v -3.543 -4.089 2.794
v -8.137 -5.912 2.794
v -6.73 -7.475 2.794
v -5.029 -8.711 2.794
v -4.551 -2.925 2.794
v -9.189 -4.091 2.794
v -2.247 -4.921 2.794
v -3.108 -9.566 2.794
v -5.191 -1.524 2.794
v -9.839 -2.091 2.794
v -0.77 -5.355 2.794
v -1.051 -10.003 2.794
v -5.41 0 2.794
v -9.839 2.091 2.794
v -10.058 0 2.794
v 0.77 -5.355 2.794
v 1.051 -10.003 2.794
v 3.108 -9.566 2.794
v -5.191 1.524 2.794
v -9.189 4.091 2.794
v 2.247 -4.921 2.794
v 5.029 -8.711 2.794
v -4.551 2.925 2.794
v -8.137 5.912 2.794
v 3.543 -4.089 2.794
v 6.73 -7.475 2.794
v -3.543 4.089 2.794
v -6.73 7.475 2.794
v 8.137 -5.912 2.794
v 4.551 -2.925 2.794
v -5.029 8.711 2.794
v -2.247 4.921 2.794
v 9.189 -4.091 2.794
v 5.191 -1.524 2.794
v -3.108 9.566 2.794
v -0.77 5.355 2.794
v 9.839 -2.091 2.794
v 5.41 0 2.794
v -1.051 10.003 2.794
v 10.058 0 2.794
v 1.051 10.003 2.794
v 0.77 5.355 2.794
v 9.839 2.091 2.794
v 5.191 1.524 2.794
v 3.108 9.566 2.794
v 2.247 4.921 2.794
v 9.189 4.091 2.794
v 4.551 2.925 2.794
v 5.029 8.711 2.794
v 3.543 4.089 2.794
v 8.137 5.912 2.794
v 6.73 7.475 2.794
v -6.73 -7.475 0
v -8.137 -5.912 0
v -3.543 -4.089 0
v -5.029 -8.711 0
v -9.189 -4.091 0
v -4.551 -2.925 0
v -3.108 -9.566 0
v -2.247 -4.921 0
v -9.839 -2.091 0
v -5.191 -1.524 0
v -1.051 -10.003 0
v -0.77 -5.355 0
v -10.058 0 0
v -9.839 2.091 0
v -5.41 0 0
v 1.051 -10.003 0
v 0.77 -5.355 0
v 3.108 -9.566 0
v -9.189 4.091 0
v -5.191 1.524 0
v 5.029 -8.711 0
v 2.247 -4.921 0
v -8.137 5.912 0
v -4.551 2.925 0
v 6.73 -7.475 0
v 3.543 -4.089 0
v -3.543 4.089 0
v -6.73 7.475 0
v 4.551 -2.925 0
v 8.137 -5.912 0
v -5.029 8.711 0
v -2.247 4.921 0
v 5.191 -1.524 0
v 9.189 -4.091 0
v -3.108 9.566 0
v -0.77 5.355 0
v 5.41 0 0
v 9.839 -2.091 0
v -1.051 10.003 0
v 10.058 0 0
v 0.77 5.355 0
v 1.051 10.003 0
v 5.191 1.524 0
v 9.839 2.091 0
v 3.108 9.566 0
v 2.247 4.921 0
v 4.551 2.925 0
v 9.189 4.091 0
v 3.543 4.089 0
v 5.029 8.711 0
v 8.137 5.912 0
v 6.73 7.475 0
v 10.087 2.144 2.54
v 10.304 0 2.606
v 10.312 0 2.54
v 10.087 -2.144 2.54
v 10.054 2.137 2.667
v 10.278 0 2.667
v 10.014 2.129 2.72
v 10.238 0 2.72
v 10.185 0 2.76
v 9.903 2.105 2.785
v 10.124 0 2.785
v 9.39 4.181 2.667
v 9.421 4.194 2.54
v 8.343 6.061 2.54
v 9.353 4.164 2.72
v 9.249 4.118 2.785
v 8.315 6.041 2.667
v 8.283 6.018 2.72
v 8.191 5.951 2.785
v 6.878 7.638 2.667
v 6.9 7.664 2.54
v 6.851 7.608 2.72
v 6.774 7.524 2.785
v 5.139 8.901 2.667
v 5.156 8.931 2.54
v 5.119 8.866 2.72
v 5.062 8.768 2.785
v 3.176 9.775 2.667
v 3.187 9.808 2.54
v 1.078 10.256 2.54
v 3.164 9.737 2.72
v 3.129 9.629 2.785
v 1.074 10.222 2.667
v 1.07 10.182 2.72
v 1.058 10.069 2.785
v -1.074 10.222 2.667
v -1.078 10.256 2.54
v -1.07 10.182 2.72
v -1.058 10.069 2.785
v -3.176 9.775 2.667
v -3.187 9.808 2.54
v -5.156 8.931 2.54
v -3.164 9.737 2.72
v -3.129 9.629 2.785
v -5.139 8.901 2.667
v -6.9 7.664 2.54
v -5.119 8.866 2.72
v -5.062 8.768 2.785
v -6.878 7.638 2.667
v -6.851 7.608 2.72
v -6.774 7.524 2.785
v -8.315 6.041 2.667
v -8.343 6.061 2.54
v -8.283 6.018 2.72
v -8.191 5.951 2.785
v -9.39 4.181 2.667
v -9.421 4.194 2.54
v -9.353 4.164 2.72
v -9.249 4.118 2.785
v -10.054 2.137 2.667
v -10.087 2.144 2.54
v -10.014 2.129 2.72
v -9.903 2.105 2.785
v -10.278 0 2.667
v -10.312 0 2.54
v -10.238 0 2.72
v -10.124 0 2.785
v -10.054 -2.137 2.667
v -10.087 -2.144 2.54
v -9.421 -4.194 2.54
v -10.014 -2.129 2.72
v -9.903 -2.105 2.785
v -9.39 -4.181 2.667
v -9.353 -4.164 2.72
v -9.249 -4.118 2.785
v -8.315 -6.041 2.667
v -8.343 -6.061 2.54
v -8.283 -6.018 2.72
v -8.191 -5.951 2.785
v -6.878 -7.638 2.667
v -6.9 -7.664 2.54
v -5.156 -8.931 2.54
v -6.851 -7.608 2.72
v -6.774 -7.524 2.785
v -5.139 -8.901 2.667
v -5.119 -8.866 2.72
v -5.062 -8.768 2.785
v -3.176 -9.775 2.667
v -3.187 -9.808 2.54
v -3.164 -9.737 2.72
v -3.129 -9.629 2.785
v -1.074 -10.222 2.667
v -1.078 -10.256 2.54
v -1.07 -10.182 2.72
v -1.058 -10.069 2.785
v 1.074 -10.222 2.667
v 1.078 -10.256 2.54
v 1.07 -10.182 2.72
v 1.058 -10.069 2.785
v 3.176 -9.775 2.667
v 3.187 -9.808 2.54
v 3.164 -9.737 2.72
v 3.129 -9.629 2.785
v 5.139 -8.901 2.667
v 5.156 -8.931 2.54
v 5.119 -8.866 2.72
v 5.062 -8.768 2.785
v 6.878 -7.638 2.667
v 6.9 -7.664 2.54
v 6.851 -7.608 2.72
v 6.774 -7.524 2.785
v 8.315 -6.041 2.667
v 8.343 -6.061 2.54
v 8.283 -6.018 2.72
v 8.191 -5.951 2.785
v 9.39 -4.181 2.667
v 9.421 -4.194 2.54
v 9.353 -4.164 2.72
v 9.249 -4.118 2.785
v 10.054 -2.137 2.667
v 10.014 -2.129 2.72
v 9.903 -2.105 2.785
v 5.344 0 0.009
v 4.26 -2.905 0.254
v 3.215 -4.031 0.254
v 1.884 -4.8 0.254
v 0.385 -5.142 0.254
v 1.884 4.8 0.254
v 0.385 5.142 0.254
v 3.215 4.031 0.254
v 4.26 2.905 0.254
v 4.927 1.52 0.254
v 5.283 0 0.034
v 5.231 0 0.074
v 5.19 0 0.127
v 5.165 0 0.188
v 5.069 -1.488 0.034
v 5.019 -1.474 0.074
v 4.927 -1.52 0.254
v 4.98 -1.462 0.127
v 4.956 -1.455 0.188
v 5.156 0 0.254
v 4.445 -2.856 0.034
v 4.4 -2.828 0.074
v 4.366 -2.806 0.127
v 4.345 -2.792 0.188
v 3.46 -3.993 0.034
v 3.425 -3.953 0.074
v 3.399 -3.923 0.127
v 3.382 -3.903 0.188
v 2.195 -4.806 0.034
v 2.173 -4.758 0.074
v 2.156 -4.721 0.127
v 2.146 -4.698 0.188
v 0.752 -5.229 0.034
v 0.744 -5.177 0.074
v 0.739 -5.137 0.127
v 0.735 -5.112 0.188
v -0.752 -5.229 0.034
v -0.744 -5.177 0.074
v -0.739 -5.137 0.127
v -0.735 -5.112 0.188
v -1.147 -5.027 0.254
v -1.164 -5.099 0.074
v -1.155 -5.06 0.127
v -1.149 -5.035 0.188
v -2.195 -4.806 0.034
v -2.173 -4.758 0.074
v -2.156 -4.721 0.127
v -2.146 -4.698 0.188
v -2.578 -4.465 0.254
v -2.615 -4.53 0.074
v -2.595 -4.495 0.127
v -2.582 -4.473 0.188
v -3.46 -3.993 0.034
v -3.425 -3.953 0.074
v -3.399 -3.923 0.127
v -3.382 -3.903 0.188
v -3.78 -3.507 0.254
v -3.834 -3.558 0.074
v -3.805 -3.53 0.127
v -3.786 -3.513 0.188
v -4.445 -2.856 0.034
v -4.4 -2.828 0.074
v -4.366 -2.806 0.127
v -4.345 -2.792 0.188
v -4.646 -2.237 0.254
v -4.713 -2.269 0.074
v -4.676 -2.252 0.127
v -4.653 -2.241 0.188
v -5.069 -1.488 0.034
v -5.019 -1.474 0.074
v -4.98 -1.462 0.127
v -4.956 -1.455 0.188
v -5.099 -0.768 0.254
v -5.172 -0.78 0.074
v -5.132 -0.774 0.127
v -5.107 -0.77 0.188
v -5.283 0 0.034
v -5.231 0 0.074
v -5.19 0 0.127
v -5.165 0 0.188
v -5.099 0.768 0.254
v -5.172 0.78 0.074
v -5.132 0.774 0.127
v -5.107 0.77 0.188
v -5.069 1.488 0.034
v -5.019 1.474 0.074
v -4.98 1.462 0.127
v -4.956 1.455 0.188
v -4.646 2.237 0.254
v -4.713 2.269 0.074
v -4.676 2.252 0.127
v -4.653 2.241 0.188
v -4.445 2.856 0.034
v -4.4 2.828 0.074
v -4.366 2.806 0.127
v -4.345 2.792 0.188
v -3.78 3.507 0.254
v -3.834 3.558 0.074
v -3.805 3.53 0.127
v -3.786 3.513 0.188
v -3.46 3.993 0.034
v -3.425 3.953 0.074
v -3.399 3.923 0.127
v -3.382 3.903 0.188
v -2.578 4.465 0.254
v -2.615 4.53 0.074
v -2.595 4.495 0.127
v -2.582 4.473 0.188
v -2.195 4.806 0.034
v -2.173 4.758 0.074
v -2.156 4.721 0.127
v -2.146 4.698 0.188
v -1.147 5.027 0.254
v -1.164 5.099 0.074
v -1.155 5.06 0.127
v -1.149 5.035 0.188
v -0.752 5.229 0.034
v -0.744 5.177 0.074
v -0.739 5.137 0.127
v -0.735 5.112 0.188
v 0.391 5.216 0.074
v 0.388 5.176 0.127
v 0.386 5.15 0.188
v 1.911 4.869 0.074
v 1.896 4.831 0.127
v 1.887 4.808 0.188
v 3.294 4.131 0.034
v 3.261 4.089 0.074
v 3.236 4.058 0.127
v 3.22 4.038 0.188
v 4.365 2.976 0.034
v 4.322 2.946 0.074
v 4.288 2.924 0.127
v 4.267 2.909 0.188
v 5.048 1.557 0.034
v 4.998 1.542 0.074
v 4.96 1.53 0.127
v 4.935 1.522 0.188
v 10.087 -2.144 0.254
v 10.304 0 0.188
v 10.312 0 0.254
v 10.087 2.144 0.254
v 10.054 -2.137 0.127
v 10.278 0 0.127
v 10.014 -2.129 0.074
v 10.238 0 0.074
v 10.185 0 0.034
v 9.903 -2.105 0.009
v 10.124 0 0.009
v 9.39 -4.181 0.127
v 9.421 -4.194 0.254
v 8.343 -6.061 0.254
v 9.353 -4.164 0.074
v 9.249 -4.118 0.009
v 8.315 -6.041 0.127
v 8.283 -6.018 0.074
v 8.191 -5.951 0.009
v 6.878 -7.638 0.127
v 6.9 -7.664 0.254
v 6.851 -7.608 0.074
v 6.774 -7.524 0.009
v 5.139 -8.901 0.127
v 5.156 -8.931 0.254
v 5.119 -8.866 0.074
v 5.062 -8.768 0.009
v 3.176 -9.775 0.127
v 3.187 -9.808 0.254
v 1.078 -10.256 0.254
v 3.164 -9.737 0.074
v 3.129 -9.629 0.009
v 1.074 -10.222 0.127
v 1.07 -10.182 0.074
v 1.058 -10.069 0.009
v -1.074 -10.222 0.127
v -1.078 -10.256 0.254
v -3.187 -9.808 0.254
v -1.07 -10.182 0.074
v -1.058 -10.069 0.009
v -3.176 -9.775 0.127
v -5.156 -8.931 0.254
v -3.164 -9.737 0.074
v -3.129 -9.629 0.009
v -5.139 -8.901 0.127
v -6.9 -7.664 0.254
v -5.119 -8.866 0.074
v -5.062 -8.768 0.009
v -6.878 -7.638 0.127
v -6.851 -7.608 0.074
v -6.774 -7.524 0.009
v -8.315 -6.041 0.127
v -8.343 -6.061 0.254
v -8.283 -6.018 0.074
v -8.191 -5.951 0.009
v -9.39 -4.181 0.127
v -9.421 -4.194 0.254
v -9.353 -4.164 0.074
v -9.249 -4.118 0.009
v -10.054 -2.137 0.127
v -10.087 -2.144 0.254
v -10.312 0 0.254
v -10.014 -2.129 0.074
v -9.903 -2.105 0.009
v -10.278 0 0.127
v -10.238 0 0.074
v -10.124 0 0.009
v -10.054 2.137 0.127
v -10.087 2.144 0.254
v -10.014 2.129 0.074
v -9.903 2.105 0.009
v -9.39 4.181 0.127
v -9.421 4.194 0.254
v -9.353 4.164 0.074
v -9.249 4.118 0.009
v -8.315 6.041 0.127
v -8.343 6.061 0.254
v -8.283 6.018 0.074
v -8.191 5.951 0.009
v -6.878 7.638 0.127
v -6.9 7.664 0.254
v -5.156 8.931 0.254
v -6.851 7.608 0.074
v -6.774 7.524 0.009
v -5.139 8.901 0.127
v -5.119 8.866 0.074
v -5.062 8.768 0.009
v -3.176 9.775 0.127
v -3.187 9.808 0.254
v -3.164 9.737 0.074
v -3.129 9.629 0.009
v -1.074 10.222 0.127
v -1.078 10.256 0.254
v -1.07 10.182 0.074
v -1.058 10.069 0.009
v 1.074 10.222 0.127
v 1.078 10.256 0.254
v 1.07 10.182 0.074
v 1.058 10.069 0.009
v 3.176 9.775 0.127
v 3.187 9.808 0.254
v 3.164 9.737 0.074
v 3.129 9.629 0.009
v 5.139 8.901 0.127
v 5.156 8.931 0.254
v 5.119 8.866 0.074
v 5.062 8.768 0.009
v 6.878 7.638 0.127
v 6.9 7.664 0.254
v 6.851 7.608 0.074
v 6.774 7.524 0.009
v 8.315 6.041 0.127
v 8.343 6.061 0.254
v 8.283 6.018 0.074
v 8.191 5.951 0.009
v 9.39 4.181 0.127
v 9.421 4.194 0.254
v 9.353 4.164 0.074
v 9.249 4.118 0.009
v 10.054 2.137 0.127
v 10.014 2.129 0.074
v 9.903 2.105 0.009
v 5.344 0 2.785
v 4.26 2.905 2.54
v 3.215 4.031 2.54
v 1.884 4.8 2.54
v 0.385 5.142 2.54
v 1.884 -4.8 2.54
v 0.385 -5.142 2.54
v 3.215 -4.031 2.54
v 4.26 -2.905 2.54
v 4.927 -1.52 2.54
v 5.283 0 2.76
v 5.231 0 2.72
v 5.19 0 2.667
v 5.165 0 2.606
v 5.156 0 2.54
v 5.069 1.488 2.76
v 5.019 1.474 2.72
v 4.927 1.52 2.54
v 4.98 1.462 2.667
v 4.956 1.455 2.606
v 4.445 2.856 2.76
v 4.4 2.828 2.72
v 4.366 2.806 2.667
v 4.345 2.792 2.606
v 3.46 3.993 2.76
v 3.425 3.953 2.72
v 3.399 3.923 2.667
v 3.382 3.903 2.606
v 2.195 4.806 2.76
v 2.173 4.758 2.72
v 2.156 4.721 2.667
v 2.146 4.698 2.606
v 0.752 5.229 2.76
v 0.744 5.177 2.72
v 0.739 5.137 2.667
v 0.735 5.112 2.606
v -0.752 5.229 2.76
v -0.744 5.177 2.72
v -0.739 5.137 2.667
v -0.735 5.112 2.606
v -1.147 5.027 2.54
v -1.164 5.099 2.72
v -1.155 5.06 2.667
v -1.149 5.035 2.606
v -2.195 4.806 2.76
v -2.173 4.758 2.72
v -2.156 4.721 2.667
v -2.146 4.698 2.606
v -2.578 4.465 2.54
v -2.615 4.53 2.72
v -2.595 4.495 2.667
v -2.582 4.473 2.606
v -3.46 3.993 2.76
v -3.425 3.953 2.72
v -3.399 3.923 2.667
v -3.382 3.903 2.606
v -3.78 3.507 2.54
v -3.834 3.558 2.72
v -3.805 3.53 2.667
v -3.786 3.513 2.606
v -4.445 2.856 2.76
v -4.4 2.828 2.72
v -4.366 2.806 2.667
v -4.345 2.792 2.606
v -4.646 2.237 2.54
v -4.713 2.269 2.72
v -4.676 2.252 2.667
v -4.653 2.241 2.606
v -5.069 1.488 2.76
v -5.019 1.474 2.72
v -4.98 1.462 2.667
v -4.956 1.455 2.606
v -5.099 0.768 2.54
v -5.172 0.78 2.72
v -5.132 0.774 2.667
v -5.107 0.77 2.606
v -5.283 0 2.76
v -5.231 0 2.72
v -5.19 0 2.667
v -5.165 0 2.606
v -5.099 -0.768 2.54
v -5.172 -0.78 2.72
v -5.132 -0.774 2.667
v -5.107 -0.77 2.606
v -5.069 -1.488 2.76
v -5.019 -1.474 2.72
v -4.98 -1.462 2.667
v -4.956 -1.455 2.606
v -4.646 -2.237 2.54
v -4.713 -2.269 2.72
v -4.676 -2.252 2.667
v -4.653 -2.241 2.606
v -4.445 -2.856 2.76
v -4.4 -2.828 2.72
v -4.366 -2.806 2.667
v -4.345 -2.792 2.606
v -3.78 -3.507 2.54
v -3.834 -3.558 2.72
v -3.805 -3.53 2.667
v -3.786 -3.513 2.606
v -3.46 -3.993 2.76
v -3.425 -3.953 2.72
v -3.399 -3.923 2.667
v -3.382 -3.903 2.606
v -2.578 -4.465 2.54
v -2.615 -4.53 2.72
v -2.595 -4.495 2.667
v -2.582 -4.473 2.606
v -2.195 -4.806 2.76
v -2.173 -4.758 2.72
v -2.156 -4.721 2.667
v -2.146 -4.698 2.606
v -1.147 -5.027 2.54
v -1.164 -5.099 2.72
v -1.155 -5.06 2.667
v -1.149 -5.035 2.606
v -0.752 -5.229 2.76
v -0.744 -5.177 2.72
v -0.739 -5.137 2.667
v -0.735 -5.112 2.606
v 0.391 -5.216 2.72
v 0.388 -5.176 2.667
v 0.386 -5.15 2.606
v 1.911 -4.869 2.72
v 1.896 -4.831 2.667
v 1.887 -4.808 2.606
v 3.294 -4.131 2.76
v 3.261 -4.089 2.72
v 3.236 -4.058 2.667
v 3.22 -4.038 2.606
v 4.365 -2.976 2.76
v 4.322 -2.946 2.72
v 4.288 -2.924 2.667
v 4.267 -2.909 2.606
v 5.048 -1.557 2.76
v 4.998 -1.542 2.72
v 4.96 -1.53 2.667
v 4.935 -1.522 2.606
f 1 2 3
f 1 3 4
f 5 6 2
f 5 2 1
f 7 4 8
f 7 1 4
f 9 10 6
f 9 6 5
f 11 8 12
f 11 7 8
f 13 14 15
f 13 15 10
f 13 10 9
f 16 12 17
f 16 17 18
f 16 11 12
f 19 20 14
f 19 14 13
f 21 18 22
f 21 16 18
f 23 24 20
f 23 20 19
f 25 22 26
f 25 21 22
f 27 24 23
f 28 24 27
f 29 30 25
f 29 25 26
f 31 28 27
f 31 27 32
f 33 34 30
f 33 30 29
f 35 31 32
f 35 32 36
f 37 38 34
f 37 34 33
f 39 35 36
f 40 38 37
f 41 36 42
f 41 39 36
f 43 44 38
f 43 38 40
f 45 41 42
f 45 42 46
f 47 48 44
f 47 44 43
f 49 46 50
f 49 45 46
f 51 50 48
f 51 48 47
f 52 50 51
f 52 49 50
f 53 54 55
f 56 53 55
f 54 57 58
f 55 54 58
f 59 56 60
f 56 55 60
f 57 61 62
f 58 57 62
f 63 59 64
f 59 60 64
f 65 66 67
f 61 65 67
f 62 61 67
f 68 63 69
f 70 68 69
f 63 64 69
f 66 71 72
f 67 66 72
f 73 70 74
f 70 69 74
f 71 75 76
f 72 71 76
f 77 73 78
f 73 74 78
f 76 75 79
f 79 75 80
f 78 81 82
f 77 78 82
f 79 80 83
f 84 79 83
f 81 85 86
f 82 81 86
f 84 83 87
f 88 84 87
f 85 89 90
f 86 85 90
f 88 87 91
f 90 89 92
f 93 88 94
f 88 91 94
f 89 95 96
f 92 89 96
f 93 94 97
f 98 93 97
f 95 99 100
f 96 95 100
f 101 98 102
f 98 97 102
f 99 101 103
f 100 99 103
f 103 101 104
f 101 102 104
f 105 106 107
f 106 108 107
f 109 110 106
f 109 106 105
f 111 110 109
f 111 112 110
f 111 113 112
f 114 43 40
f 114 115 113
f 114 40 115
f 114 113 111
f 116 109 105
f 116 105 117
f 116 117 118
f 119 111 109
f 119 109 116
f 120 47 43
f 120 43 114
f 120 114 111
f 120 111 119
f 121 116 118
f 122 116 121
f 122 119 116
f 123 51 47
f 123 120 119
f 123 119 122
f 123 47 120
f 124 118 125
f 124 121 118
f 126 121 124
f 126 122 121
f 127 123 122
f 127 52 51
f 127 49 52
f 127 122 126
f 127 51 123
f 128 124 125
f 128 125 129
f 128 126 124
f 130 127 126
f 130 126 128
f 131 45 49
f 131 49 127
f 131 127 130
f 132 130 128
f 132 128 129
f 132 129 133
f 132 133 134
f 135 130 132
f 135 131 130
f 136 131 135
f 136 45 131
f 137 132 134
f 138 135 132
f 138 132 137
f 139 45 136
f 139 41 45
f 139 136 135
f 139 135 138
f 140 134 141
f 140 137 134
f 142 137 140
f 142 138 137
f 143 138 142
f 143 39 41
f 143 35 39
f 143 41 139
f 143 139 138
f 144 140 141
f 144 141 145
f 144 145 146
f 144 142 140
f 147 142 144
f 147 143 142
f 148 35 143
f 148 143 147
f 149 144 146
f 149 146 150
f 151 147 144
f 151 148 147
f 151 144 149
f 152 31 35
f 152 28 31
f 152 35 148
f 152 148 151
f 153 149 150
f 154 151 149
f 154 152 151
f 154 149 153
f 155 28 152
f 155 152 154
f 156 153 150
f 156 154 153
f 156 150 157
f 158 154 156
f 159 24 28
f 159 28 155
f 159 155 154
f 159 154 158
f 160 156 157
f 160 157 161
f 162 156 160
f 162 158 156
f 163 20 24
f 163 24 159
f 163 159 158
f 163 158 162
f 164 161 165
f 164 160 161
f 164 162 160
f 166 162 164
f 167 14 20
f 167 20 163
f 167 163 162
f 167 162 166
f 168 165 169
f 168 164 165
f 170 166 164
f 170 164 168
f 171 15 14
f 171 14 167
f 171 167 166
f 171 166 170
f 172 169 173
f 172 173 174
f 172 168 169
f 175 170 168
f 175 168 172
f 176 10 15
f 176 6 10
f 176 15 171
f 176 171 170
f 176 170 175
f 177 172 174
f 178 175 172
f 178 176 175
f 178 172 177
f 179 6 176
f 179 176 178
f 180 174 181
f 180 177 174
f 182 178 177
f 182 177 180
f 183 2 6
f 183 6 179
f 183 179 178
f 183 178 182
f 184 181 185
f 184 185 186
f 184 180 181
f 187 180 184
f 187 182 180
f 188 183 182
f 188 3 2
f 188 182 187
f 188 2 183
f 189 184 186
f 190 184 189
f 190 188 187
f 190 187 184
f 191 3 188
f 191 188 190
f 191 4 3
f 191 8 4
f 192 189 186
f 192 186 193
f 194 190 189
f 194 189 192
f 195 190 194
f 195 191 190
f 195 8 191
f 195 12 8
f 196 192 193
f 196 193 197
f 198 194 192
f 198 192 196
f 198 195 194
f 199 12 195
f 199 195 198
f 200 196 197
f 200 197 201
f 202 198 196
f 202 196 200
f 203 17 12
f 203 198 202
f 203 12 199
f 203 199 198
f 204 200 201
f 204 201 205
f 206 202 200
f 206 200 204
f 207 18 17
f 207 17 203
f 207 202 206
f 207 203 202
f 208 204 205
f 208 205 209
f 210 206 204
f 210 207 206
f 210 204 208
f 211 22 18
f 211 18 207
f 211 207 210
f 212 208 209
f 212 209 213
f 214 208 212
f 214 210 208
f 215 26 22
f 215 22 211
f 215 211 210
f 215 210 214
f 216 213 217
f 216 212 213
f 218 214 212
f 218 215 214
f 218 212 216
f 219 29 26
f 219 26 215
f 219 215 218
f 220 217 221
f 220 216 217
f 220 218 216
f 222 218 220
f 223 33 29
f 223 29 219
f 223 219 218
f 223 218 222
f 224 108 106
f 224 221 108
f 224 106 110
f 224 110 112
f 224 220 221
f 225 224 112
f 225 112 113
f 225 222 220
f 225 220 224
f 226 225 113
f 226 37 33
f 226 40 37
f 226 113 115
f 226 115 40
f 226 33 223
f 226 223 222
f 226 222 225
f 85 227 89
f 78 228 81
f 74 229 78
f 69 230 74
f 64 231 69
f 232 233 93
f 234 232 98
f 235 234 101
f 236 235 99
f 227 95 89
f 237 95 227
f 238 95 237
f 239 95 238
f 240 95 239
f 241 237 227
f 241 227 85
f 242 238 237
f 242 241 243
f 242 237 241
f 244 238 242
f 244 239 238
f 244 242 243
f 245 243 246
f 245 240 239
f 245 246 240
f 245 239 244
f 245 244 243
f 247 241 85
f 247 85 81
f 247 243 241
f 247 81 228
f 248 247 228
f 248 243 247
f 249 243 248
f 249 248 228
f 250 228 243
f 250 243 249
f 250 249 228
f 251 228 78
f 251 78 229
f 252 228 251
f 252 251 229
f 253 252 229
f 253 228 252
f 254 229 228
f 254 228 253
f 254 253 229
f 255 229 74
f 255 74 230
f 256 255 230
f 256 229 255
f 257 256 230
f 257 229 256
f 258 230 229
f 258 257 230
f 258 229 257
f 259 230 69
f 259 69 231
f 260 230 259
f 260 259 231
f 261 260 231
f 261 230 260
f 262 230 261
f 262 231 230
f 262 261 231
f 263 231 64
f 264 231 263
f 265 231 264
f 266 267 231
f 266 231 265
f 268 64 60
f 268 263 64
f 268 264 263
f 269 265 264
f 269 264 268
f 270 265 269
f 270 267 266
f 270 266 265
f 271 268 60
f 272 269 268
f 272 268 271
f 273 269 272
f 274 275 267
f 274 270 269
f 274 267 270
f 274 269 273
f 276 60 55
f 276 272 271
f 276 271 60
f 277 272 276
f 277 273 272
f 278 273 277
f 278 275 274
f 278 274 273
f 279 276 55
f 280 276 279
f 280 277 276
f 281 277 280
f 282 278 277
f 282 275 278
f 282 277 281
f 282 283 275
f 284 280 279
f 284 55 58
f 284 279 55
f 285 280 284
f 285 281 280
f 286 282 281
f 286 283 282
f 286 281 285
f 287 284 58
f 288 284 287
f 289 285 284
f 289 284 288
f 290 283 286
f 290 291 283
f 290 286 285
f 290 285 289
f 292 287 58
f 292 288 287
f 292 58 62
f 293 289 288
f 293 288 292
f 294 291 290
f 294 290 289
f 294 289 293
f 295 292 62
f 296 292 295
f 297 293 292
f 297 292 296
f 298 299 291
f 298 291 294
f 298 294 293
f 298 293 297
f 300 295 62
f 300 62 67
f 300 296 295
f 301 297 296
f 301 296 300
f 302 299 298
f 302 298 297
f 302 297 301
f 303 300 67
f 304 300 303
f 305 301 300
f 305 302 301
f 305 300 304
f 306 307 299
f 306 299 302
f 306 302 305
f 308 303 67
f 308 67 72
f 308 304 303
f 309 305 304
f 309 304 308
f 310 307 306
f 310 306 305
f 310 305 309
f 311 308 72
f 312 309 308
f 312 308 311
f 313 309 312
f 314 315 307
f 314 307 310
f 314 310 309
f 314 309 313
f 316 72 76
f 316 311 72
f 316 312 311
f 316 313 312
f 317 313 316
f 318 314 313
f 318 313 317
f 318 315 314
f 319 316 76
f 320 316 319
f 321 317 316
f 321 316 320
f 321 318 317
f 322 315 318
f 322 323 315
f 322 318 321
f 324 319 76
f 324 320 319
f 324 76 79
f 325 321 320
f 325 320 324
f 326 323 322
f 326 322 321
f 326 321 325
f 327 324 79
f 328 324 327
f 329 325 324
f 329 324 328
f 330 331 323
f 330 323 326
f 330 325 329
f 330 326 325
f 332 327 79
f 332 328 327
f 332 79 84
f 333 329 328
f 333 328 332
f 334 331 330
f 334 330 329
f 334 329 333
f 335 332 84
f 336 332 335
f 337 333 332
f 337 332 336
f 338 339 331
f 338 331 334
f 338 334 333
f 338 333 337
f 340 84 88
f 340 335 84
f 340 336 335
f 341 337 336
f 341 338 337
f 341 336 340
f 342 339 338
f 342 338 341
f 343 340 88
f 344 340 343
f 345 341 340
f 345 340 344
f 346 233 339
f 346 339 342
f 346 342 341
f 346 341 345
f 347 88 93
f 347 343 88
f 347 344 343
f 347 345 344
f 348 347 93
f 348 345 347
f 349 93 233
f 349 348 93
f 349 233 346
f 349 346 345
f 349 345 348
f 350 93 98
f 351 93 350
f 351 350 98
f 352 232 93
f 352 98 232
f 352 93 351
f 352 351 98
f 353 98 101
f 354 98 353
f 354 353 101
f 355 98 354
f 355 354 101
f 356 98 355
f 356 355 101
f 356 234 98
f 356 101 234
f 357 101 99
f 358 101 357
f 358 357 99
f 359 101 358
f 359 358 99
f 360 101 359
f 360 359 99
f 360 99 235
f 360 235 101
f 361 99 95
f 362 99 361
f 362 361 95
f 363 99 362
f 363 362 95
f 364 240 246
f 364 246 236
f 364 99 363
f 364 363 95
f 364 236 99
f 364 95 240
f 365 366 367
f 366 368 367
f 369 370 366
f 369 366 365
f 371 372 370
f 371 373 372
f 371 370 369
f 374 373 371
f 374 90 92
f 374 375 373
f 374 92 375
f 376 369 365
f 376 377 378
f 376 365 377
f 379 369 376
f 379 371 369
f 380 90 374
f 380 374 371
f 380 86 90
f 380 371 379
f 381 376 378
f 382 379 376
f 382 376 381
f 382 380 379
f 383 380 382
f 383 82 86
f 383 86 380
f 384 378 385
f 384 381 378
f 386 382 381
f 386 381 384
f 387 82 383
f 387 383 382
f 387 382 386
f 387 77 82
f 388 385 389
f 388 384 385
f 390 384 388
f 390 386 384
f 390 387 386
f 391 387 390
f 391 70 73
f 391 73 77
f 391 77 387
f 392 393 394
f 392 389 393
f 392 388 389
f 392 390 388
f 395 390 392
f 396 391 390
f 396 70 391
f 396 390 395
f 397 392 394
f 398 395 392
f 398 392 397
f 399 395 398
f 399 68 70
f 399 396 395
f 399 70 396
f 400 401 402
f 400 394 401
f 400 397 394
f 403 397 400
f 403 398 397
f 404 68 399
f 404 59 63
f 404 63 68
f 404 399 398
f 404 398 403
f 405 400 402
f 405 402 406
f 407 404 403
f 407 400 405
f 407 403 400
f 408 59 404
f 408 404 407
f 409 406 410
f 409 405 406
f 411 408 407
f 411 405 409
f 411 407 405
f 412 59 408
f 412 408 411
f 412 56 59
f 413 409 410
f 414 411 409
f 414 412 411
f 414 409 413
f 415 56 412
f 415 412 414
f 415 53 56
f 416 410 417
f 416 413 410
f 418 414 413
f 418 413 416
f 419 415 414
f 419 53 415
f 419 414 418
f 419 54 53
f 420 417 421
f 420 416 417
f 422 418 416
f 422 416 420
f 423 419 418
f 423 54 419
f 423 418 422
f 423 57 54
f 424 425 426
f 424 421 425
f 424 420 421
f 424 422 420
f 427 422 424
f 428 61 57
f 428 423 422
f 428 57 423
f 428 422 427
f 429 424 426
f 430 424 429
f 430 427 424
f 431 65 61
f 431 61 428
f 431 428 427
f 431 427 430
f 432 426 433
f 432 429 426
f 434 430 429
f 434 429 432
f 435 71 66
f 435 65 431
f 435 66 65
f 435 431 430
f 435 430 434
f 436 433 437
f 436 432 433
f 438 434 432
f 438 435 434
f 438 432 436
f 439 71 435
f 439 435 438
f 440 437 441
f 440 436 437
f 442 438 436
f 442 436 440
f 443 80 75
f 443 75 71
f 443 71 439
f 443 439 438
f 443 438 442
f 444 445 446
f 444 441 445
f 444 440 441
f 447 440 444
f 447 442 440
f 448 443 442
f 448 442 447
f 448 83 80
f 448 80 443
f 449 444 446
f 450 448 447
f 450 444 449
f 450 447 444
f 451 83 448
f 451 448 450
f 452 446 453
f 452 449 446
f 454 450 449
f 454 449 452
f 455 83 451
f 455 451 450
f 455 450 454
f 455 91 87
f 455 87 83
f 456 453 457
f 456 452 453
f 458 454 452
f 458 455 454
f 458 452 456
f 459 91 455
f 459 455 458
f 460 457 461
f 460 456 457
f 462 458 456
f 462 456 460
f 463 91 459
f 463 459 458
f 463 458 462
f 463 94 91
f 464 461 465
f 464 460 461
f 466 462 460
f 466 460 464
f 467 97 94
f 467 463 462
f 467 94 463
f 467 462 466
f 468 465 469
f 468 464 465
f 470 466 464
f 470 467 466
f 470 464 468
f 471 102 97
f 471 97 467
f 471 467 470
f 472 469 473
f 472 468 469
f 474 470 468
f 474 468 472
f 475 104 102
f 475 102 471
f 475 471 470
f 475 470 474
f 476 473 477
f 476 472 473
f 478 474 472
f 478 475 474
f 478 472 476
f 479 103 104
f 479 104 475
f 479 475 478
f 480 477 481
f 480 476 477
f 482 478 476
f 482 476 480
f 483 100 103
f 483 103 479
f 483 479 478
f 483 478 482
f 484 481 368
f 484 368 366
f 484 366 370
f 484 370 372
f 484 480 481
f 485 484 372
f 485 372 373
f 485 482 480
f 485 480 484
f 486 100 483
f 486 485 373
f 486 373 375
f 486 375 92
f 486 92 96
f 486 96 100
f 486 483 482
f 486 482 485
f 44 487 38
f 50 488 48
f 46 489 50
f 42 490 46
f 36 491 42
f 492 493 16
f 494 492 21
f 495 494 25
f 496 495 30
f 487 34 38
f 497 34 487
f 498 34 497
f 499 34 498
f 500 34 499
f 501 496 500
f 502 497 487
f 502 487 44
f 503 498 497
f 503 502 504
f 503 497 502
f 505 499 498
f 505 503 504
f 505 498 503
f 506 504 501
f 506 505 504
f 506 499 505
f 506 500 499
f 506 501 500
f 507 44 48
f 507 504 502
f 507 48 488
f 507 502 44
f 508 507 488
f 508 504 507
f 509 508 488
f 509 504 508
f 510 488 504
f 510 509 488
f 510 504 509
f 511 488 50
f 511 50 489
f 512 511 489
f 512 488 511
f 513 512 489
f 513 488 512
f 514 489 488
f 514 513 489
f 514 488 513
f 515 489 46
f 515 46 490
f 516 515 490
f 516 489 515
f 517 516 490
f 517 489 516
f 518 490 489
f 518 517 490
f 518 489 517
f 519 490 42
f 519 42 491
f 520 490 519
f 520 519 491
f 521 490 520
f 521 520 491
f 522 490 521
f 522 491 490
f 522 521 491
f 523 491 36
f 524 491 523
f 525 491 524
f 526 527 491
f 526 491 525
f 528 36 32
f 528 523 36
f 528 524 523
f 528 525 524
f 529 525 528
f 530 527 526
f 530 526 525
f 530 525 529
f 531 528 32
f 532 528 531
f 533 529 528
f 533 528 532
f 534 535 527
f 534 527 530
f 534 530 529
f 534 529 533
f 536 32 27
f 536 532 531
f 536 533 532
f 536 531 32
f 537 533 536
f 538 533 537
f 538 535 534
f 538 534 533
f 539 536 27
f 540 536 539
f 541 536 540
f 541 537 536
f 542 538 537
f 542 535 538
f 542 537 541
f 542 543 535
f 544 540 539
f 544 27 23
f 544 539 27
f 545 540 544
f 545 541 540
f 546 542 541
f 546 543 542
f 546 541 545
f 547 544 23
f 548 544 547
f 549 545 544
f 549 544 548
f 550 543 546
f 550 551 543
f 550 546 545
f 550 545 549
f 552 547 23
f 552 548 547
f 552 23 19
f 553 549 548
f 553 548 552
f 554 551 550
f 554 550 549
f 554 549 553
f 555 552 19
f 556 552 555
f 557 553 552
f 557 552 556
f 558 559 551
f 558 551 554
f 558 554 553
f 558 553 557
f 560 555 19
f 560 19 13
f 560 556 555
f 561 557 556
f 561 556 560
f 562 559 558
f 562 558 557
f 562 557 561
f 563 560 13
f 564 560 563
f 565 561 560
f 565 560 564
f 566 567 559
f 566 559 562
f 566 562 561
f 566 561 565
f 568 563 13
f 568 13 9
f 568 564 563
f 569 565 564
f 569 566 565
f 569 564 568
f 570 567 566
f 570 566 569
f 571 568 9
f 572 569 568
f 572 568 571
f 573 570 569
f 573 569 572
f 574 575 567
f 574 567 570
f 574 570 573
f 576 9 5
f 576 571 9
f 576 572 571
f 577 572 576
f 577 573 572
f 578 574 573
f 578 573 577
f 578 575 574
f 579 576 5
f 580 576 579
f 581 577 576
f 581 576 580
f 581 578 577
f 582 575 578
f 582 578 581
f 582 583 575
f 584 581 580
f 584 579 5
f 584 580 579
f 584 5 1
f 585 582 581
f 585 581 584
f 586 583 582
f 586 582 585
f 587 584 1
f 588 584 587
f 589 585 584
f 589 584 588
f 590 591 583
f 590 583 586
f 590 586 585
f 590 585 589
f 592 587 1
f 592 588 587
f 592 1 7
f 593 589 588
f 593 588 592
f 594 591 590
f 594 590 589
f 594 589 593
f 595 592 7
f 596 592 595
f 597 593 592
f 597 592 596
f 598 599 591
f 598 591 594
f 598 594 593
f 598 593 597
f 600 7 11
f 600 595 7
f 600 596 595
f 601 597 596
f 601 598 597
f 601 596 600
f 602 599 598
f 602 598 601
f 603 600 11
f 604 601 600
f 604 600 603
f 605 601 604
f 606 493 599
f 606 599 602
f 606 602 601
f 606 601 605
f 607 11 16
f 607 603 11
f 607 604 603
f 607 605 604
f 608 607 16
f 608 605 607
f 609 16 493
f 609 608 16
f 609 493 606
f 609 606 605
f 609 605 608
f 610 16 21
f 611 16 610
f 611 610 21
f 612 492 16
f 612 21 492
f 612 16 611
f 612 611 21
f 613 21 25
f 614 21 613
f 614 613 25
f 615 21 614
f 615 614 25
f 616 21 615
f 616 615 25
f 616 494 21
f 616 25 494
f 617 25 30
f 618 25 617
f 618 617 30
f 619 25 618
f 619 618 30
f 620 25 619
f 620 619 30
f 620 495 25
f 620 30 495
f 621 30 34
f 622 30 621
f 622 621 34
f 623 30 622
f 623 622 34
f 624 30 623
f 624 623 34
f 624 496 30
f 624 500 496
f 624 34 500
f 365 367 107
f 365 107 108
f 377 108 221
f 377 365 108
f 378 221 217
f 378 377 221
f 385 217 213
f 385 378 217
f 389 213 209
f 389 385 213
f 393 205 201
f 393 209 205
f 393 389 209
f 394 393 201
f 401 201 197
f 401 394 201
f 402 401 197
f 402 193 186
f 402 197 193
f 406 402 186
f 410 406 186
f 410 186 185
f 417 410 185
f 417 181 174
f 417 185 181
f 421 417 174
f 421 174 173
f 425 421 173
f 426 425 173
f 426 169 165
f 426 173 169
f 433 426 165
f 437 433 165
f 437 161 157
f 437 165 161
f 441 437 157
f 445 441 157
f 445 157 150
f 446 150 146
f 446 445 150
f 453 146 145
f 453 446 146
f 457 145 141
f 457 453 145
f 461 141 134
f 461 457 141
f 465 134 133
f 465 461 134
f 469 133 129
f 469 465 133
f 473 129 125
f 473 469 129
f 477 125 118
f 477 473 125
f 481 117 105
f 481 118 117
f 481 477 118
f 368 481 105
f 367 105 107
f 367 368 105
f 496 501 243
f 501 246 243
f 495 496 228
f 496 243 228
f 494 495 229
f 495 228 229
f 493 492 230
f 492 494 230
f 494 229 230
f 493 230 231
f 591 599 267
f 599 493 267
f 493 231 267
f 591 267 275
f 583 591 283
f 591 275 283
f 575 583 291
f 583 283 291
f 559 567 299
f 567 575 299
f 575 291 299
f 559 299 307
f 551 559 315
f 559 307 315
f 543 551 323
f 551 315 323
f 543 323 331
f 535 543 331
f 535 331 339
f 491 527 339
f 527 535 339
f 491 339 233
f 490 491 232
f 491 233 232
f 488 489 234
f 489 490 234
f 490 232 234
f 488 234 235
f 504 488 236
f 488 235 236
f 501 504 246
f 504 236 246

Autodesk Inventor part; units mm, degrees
ref_plane "YZ Plane" through (0, 0, 0) normal (1, 0, 0) x (0, 1, 0)
ref_plane "XZ Plane" through (0, 0, 0) normal (0, 1, 0) x (-1, 0, 0)
ref_plane "XY Plane" through (0, 0, 0) normal (0, 0, 1) x (1, 0, 0)
sketch "Sketch1" plane through (0, 0, 0) normal (0, 0, 1) x (1, 0, 0)
  circle A0 centre (0, 0) radius 5.1562
  circle A1 centre (0, 0) radius 10.3124
  dimension "d0" = 10.3124
  dimension "d1" = 20.6248
extrude "Extrusion1" add sketch "Sketch1" along normal blind 2.794
fillet "Fillet1" radius 0.254 2 edges at (-10.3124, 0, 2.794) (-10.3124, 0, 0)
fillet "Fillet2" radius 0.254 2 edges at (-5.1562, 0, 2.794) (-5.1562, 0, 0)
properties part number "375 washer structural 112 thick" material "Steel"
